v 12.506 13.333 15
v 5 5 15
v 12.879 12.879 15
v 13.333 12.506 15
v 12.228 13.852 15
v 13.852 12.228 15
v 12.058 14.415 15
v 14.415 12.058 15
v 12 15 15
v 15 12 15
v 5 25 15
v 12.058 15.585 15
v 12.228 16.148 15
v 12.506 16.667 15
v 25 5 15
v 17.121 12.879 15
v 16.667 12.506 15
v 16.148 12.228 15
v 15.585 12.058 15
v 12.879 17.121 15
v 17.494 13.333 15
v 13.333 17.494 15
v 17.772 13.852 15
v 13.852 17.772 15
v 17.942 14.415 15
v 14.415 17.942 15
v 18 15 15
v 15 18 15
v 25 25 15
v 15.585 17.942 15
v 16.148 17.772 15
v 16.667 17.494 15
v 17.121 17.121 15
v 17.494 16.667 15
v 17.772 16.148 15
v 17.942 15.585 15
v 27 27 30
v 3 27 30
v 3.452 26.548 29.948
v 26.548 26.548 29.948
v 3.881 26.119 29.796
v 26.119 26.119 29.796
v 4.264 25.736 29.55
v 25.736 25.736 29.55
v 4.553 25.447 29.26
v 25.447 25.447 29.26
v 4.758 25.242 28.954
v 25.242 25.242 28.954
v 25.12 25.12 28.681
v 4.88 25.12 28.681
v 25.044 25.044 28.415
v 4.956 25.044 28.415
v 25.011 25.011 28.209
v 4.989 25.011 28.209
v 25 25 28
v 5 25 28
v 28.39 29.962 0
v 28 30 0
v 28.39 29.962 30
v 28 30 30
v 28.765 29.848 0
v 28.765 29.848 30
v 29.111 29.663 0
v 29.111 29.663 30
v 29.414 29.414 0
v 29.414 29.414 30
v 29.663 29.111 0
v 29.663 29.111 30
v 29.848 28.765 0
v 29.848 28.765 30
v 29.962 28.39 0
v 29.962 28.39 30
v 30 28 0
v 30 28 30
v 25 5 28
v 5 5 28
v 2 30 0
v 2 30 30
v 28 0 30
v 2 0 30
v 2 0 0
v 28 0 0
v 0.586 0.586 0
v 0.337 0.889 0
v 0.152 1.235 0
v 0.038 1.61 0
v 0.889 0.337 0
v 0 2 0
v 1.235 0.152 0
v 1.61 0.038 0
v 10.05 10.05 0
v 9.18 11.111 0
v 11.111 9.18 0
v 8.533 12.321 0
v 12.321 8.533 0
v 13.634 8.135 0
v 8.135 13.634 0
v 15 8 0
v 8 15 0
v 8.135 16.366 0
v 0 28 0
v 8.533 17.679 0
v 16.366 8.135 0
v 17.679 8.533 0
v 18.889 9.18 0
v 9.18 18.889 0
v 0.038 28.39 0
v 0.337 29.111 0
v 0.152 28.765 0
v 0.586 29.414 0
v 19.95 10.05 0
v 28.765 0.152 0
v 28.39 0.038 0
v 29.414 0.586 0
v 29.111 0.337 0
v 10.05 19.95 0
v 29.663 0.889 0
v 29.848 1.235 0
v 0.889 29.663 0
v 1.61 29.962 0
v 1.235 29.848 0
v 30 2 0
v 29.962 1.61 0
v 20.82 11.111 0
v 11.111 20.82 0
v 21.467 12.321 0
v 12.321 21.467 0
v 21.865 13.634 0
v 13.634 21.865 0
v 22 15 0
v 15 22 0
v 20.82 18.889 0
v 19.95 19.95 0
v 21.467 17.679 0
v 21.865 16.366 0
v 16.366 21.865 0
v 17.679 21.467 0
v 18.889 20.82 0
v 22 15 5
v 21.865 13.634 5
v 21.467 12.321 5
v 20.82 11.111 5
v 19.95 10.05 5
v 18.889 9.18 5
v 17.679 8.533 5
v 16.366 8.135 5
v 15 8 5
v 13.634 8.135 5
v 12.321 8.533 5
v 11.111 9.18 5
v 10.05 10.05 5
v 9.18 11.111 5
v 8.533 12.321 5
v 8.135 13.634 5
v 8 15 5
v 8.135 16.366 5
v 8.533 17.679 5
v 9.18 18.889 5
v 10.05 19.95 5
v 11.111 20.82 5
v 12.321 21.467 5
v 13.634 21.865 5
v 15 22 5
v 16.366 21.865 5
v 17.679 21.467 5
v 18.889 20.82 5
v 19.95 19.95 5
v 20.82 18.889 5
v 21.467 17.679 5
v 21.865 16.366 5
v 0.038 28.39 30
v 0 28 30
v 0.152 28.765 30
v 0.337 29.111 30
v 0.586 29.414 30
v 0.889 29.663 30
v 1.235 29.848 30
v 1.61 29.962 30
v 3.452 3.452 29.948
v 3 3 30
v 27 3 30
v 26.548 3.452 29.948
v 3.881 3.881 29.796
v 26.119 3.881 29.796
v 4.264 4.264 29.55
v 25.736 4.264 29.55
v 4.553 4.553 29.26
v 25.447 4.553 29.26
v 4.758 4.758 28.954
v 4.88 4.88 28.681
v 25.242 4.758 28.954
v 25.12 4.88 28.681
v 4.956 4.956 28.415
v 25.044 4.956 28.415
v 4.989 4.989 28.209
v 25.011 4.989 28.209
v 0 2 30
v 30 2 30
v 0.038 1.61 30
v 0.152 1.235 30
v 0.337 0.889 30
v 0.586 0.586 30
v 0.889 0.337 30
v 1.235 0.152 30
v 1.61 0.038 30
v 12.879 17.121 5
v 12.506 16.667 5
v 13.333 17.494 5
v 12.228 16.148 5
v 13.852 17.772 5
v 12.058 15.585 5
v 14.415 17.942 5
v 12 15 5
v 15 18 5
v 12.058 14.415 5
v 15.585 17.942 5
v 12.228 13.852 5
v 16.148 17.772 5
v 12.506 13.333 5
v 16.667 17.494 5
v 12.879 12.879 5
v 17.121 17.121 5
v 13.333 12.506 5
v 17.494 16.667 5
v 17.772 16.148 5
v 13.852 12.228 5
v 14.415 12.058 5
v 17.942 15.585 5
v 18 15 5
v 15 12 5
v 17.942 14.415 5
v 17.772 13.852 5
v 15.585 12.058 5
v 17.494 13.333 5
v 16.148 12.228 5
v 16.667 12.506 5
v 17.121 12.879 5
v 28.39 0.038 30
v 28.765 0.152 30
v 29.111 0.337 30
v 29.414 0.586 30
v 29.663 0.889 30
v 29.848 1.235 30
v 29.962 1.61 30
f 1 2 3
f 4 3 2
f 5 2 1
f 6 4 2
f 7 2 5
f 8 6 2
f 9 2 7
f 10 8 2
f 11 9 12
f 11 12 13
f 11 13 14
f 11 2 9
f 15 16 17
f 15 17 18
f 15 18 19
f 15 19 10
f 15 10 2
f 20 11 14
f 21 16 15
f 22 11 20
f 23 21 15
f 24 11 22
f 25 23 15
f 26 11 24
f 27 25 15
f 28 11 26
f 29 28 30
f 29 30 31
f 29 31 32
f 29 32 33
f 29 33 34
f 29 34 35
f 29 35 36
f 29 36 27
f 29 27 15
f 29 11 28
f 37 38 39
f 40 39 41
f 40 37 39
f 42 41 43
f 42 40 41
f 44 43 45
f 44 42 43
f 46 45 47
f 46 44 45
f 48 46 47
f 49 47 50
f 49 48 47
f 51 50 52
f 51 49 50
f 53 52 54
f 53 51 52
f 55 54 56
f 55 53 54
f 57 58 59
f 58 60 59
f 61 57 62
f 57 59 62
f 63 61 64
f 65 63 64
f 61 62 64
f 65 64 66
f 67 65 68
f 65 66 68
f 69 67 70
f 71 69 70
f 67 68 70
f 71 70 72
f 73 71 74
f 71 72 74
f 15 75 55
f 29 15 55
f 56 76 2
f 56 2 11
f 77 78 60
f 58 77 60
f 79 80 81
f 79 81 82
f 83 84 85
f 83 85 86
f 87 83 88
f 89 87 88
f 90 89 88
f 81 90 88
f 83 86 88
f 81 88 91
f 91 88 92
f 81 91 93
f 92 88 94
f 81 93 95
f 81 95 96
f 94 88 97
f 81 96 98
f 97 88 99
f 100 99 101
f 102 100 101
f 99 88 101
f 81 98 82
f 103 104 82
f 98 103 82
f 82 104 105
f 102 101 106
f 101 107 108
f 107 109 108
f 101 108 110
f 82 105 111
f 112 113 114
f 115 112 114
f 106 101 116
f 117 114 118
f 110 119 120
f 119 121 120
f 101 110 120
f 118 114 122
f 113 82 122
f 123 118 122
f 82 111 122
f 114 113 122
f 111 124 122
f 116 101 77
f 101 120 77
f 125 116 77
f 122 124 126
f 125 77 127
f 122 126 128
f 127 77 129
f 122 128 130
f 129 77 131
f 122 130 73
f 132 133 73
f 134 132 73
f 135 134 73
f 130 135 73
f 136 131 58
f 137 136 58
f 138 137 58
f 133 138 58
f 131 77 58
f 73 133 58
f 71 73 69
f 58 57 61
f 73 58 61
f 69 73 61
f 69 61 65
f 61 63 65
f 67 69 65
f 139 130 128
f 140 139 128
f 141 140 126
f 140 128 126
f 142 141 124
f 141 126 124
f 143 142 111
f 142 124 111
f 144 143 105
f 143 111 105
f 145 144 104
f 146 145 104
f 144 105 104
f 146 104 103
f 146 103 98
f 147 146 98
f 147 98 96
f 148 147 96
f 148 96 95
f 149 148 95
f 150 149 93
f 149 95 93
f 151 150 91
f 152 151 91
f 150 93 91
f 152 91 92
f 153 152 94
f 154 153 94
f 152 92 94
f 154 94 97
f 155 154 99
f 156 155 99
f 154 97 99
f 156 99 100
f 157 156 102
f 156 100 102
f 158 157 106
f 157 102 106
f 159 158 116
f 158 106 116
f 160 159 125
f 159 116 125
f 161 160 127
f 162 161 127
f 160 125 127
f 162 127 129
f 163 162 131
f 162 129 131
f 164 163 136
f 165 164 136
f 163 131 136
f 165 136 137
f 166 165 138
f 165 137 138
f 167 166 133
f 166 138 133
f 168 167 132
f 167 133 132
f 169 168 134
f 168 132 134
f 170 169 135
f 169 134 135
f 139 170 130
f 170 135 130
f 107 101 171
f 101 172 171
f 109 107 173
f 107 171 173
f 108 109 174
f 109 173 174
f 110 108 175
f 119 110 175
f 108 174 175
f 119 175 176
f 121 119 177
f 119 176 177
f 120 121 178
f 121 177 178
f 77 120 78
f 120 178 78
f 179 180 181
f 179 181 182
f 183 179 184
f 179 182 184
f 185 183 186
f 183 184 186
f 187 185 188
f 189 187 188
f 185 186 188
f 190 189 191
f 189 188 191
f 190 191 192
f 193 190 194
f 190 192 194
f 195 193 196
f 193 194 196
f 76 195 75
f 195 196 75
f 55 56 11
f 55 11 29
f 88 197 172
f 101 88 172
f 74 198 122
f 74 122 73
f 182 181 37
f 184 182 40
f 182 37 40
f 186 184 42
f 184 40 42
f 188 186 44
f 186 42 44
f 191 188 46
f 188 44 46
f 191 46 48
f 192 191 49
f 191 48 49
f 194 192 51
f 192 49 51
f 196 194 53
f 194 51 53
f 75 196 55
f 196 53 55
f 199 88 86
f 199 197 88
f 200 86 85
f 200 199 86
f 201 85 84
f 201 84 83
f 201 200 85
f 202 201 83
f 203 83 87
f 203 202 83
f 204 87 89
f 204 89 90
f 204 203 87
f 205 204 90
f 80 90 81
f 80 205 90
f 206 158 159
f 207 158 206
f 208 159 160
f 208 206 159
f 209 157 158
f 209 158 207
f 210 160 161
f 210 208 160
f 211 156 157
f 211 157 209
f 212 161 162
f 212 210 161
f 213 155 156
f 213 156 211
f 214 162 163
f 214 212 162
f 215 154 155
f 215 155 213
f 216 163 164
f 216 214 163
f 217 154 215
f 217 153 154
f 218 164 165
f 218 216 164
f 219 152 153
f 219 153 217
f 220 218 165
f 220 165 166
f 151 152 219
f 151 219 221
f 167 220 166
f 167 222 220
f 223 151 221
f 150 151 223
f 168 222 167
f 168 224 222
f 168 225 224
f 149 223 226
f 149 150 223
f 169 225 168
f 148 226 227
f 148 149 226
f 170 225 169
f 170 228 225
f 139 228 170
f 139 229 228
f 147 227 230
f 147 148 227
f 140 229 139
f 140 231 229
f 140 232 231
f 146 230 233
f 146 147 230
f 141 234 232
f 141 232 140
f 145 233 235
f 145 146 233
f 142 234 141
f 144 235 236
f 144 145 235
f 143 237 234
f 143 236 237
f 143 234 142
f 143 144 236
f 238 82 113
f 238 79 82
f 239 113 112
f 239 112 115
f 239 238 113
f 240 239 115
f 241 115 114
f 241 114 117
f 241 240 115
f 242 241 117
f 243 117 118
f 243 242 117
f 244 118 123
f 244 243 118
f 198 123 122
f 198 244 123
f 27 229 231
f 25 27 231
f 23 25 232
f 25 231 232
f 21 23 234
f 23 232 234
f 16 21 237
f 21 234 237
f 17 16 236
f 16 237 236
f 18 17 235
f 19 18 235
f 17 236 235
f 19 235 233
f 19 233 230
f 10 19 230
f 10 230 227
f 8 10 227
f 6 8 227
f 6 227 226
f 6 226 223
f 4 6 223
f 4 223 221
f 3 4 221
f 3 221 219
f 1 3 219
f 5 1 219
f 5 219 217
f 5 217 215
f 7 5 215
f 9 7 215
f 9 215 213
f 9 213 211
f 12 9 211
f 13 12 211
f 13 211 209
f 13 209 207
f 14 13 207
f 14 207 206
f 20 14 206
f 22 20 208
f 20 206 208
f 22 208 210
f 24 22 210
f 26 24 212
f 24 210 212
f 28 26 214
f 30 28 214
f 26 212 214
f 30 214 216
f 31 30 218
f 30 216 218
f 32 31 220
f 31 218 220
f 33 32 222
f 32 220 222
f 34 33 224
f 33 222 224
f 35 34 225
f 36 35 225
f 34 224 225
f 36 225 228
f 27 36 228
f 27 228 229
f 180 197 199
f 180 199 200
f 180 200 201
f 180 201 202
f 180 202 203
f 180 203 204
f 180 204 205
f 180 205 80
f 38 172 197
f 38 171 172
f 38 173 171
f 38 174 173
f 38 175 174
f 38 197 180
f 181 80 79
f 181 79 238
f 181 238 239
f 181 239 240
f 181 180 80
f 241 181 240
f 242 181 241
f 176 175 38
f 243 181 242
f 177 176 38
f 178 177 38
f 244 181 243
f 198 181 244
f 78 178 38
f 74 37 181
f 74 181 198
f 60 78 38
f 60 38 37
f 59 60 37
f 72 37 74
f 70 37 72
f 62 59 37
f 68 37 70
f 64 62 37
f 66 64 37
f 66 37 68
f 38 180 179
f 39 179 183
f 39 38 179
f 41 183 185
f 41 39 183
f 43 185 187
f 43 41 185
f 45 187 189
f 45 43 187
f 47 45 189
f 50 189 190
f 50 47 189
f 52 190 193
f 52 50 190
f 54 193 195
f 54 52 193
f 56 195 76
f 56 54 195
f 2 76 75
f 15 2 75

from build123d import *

# Parameters (mm, degrees)
F0_W     = 30
F0_H     = 30
F1_DEPTH = 30
F2_W     = 20
F2_H     = 20
F3_DEPTH = 15
F4_R     = 3
F5_DEPTH = 25
F6_R     = 7
F7_DEPTH = 5
F8_R     = 2


with BuildPart() as f1:
    # F0 (on Top) → F1 (new body)
    with BuildSketch(Plane.XY):
        with Locations((15, 15)):
            Rectangle(F0_W, F0_H)
    extrude(amount=F1_DEPTH)

    # F2 (on face) → F3 (cut)
    with BuildSketch(Plane.XY.offset(30)):
        with Locations((15, 15)):
            Rectangle(F2_W, F2_H)
    extrude(amount=-F3_DEPTH, mode=Mode.SUBTRACT)

    # F4 (on face) → F5 (cut)
    with BuildSketch(Plane(origin=(0, 0, 0), x_dir=(1, 0, 0), z_dir=(0, 0, -1))):
        with Locations((15, -15)):
            Circle(F4_R)
    extrude(amount=-F5_DEPTH, mode=Mode.SUBTRACT)

    # F6 (on face) → F7 (cut)
    with BuildSketch(Plane(origin=(0, 0, 0), x_dir=(1, 0, 0), z_dir=(0, 0, -1))):
        with Locations((15, -15)):
            Circle(F6_R)
    extrude(amount=-F7_DEPTH, mode=Mode.SUBTRACT)

    # F8
    f8_edges = [f1.edges().sort_by_distance(p)[0] for p in [
        (5, 15, 30),
        (15, 25, 30),
        (25, 15, 30),
        (15, 5, 30),
        (30, 0, 15),
        (30, 30, 15),
        (0, 0, 15),
        (0, 30, 15),
    ]]
    fillet(f8_edges, radius=F8_R)


solid = f1.part
